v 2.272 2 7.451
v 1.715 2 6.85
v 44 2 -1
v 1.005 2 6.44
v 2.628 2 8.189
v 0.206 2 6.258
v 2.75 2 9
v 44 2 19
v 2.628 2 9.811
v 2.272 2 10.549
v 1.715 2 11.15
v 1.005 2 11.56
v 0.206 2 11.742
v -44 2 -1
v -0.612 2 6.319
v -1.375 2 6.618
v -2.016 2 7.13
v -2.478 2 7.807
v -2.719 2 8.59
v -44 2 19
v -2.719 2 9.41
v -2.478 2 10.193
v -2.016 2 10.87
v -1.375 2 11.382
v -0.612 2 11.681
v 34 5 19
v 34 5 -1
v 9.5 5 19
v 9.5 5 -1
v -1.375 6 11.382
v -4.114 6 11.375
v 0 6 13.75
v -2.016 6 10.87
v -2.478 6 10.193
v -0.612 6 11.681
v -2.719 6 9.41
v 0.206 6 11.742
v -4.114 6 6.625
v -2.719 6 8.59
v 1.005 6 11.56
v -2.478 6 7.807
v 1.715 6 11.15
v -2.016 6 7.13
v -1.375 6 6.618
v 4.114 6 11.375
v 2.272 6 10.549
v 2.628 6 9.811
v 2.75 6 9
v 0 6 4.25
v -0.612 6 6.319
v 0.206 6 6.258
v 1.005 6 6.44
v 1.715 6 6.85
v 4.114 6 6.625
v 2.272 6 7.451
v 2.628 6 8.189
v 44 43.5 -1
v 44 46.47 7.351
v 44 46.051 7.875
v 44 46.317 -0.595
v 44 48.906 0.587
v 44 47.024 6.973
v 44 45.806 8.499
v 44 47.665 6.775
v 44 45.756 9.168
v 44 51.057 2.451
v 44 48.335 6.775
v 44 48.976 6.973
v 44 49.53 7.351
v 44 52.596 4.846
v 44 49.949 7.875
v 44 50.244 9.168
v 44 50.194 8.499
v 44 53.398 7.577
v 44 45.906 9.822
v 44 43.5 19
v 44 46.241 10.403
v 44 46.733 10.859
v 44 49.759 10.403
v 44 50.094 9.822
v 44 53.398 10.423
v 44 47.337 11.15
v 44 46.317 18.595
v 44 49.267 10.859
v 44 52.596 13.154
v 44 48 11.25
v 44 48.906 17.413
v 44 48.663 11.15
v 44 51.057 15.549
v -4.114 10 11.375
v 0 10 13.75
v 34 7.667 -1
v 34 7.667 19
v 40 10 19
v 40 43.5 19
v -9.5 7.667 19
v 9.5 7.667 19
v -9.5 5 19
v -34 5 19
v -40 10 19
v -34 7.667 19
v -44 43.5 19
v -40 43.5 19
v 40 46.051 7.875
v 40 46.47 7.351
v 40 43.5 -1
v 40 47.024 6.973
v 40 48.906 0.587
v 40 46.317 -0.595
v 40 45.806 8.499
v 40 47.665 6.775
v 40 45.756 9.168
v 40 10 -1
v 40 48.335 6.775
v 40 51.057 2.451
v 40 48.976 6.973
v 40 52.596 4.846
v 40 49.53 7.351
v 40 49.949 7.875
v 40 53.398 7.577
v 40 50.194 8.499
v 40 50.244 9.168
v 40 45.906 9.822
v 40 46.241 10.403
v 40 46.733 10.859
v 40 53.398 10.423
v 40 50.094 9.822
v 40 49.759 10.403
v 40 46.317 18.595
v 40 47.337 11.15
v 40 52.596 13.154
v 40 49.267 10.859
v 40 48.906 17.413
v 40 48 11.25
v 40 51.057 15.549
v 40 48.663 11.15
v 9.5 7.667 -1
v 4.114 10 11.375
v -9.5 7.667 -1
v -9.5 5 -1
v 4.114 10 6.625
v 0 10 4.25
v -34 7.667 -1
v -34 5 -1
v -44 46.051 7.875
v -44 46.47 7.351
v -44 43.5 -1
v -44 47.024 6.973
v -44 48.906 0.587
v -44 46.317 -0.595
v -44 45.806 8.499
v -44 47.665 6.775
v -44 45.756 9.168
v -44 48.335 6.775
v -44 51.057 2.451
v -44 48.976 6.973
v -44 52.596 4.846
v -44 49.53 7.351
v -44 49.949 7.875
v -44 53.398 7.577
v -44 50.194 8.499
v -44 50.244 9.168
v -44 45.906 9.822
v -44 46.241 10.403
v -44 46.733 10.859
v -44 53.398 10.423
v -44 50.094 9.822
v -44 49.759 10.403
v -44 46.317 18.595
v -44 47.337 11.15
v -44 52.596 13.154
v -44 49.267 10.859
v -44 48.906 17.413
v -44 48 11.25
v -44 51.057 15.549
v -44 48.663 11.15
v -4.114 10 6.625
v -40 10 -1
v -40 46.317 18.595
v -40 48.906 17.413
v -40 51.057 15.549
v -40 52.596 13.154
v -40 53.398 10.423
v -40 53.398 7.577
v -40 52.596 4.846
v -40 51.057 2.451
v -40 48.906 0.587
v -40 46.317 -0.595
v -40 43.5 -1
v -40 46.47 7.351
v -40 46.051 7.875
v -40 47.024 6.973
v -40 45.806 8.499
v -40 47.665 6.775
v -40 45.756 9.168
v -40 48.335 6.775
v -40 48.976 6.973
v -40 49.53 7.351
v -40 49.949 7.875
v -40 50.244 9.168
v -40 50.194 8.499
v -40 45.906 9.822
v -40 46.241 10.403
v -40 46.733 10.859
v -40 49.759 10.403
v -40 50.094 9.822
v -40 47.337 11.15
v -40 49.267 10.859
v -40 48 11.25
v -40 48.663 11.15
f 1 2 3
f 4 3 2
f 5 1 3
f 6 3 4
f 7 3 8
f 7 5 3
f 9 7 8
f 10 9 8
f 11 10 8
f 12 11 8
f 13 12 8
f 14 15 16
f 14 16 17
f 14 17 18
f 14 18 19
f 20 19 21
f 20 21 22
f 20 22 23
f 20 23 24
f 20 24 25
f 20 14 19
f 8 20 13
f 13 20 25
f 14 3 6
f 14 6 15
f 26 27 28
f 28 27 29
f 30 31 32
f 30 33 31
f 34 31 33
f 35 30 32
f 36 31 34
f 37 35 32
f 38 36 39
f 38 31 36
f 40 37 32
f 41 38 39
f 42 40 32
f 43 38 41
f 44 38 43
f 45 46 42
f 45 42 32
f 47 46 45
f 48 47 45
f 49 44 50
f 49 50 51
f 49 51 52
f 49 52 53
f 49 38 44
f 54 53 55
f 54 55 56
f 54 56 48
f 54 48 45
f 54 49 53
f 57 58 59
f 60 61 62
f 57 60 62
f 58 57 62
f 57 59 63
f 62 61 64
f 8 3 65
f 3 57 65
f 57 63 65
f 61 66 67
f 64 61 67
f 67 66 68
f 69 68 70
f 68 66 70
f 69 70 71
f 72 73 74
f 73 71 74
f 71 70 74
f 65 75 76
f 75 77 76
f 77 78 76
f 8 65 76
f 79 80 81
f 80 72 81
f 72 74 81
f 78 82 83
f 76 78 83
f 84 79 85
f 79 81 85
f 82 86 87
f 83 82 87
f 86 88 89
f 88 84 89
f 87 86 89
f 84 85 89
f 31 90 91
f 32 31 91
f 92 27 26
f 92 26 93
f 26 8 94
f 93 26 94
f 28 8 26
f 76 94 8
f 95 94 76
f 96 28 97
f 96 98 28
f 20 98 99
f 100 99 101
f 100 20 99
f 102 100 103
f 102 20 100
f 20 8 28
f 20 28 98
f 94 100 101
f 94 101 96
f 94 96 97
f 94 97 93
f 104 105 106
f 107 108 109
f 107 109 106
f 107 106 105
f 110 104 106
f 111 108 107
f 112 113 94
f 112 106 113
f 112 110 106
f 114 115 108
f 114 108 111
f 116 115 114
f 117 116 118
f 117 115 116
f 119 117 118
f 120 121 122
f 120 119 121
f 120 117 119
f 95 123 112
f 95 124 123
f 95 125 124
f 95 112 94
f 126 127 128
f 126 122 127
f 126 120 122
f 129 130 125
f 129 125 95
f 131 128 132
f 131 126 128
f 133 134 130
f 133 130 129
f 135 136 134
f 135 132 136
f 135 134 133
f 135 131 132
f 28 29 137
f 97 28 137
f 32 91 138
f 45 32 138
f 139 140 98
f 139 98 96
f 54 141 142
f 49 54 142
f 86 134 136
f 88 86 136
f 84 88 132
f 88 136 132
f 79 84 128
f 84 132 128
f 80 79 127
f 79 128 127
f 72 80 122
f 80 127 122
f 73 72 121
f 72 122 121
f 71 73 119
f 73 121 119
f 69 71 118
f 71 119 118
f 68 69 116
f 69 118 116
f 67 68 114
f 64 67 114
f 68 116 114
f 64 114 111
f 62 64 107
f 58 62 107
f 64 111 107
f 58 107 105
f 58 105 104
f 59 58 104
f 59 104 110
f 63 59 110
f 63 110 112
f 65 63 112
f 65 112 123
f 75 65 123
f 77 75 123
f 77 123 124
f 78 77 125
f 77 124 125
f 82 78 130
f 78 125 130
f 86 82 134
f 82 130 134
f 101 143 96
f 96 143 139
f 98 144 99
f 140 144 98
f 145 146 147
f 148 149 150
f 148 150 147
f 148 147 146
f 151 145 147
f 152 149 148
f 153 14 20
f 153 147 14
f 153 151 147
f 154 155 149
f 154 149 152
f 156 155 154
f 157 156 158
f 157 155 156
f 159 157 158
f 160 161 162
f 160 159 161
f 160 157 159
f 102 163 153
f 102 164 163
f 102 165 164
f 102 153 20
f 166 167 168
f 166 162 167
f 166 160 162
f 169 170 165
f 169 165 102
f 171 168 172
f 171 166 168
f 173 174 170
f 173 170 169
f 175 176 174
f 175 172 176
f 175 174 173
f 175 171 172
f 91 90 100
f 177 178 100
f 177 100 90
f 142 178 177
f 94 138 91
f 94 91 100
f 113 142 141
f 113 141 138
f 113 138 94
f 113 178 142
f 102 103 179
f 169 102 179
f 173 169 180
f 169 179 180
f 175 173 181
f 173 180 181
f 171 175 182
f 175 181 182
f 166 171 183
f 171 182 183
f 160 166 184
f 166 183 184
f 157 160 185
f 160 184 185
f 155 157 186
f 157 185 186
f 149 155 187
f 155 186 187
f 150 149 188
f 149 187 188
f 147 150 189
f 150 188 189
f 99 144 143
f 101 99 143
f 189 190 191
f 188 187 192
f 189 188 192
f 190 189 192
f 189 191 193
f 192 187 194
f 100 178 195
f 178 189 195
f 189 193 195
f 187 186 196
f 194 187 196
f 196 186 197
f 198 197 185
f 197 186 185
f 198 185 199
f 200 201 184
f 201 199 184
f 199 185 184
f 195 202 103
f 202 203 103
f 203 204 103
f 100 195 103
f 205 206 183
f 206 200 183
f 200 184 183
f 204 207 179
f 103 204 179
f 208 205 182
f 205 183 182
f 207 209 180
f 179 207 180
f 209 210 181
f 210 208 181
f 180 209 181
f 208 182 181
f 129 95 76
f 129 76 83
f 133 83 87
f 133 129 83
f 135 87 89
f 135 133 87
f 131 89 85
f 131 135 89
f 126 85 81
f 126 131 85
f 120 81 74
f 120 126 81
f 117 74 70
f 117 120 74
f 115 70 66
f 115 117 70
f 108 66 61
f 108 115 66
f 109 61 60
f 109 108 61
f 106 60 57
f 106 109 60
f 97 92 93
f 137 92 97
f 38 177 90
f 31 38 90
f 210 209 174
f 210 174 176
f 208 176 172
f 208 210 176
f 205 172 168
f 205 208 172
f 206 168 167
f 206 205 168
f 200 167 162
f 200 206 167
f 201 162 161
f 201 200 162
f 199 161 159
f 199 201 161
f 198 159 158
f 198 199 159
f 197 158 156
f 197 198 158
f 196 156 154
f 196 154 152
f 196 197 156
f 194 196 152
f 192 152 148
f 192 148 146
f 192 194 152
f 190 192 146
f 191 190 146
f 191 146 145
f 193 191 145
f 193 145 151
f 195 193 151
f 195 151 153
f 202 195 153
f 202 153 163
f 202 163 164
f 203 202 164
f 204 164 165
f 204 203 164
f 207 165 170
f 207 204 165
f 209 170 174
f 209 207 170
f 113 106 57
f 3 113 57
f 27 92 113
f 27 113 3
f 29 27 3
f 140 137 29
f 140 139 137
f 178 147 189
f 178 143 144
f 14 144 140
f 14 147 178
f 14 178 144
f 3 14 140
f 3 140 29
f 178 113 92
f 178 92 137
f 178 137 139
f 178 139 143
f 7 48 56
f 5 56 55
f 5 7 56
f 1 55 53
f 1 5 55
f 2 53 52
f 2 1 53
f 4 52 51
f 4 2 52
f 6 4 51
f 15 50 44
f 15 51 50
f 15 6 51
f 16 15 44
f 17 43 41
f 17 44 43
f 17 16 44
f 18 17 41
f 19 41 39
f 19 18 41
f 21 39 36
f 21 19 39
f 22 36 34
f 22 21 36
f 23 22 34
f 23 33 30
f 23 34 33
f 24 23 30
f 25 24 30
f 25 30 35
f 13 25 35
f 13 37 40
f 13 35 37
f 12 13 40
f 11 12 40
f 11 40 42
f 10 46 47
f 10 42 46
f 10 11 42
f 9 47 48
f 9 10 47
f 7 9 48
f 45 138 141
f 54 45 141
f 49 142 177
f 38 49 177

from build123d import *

# Parameters (mm, degrees)
SKETCH005_W             = 80
SKETCH005_H             = 20
SKETCH005_R             = 2.75
PAD010_DEPTH            = 8
POCKET009_DEPTH         = 4
SKETCH011_W             = 24.5
SKETCH011_H             = 2.666667
POCKET010_DEPTH         = 185.699521
SKETCH017_R             = 2.25
PAD011_DEPTH            = 4
BODY002_PLACEMENT_ANGLE = 180


with BuildPart() as part:
    # Sketch005 → Pad010 (new body)
    with BuildSketch(Plane.XZ):
        Rectangle(SKETCH005_W, SKETCH005_H)
        Circle(SKETCH005_R, mode=Mode.SUBTRACT)
    extrude(amount=PAD010_DEPTH)

    # Sketch007 → Pocket009 (cut)
    with BuildSketch(Plane.XZ.offset(8)):
        Polygon((4.113621, 2.375), (0, 4.75), (-4.113621, 2.375), (-4.113621, -2.375), (0, -4.75), (4.113621, -2.375), align=None)
    extrude(amount=-POCKET009_DEPTH, mode=Mode.SUBTRACT)

    # Sketch011 → Pocket010 (cut, through all)
    with BuildSketch(Plane(origin=(0, 0, 10), x_dir=(-1, 0, 0), z_dir=(0, 0, 1))):
        with Locations((-21.75, 4.333334)):
            Rectangle(SKETCH011_W, SKETCH011_H)
    pocket010 = extrude(amount=-POCKET010_DEPTH, mode=Mode.SUBTRACT)

    # Sketch017 (on Face4 of Pad010) → Pad011 (join)
    with BuildSketch(Plane(origin=(-40, 0, 0), x_dir=(0, 0, -1), z_dir=(-1, 0, 0))):
        with BuildLine():
            Line((-10, 0), (10, 0))
            Line((10, 0), (10, 41.5))
            ThreePointArc((10, 41.5), (0, 51.5), (-10, 41.5))
            Line((-10, 41.5), (-10, 0))
        make_face()
        with Locations((0, 46)):
            Circle(SKETCH017_R, mode=Mode.SUBTRACT)
    pad011 = extrude(amount=PAD011_DEPTH)

    # Mirrored007: Pad011 across YZ
    add(pad011.mirror(Plane.YZ))

    # Mirrored008: Pocket010 across YZ
    add(pocket010.mirror(Plane.YZ), mode=Mode.SUBTRACT)


with BuildPart() as part_1:
    # Body002 placement: moved
    add(part.part.moved(Location((0, 2, 9))).rotate(Axis((0, 2, 9), (1, 0, 0)), BODY002_PLACEMENT_ANGLE))


solid = part_1.part
